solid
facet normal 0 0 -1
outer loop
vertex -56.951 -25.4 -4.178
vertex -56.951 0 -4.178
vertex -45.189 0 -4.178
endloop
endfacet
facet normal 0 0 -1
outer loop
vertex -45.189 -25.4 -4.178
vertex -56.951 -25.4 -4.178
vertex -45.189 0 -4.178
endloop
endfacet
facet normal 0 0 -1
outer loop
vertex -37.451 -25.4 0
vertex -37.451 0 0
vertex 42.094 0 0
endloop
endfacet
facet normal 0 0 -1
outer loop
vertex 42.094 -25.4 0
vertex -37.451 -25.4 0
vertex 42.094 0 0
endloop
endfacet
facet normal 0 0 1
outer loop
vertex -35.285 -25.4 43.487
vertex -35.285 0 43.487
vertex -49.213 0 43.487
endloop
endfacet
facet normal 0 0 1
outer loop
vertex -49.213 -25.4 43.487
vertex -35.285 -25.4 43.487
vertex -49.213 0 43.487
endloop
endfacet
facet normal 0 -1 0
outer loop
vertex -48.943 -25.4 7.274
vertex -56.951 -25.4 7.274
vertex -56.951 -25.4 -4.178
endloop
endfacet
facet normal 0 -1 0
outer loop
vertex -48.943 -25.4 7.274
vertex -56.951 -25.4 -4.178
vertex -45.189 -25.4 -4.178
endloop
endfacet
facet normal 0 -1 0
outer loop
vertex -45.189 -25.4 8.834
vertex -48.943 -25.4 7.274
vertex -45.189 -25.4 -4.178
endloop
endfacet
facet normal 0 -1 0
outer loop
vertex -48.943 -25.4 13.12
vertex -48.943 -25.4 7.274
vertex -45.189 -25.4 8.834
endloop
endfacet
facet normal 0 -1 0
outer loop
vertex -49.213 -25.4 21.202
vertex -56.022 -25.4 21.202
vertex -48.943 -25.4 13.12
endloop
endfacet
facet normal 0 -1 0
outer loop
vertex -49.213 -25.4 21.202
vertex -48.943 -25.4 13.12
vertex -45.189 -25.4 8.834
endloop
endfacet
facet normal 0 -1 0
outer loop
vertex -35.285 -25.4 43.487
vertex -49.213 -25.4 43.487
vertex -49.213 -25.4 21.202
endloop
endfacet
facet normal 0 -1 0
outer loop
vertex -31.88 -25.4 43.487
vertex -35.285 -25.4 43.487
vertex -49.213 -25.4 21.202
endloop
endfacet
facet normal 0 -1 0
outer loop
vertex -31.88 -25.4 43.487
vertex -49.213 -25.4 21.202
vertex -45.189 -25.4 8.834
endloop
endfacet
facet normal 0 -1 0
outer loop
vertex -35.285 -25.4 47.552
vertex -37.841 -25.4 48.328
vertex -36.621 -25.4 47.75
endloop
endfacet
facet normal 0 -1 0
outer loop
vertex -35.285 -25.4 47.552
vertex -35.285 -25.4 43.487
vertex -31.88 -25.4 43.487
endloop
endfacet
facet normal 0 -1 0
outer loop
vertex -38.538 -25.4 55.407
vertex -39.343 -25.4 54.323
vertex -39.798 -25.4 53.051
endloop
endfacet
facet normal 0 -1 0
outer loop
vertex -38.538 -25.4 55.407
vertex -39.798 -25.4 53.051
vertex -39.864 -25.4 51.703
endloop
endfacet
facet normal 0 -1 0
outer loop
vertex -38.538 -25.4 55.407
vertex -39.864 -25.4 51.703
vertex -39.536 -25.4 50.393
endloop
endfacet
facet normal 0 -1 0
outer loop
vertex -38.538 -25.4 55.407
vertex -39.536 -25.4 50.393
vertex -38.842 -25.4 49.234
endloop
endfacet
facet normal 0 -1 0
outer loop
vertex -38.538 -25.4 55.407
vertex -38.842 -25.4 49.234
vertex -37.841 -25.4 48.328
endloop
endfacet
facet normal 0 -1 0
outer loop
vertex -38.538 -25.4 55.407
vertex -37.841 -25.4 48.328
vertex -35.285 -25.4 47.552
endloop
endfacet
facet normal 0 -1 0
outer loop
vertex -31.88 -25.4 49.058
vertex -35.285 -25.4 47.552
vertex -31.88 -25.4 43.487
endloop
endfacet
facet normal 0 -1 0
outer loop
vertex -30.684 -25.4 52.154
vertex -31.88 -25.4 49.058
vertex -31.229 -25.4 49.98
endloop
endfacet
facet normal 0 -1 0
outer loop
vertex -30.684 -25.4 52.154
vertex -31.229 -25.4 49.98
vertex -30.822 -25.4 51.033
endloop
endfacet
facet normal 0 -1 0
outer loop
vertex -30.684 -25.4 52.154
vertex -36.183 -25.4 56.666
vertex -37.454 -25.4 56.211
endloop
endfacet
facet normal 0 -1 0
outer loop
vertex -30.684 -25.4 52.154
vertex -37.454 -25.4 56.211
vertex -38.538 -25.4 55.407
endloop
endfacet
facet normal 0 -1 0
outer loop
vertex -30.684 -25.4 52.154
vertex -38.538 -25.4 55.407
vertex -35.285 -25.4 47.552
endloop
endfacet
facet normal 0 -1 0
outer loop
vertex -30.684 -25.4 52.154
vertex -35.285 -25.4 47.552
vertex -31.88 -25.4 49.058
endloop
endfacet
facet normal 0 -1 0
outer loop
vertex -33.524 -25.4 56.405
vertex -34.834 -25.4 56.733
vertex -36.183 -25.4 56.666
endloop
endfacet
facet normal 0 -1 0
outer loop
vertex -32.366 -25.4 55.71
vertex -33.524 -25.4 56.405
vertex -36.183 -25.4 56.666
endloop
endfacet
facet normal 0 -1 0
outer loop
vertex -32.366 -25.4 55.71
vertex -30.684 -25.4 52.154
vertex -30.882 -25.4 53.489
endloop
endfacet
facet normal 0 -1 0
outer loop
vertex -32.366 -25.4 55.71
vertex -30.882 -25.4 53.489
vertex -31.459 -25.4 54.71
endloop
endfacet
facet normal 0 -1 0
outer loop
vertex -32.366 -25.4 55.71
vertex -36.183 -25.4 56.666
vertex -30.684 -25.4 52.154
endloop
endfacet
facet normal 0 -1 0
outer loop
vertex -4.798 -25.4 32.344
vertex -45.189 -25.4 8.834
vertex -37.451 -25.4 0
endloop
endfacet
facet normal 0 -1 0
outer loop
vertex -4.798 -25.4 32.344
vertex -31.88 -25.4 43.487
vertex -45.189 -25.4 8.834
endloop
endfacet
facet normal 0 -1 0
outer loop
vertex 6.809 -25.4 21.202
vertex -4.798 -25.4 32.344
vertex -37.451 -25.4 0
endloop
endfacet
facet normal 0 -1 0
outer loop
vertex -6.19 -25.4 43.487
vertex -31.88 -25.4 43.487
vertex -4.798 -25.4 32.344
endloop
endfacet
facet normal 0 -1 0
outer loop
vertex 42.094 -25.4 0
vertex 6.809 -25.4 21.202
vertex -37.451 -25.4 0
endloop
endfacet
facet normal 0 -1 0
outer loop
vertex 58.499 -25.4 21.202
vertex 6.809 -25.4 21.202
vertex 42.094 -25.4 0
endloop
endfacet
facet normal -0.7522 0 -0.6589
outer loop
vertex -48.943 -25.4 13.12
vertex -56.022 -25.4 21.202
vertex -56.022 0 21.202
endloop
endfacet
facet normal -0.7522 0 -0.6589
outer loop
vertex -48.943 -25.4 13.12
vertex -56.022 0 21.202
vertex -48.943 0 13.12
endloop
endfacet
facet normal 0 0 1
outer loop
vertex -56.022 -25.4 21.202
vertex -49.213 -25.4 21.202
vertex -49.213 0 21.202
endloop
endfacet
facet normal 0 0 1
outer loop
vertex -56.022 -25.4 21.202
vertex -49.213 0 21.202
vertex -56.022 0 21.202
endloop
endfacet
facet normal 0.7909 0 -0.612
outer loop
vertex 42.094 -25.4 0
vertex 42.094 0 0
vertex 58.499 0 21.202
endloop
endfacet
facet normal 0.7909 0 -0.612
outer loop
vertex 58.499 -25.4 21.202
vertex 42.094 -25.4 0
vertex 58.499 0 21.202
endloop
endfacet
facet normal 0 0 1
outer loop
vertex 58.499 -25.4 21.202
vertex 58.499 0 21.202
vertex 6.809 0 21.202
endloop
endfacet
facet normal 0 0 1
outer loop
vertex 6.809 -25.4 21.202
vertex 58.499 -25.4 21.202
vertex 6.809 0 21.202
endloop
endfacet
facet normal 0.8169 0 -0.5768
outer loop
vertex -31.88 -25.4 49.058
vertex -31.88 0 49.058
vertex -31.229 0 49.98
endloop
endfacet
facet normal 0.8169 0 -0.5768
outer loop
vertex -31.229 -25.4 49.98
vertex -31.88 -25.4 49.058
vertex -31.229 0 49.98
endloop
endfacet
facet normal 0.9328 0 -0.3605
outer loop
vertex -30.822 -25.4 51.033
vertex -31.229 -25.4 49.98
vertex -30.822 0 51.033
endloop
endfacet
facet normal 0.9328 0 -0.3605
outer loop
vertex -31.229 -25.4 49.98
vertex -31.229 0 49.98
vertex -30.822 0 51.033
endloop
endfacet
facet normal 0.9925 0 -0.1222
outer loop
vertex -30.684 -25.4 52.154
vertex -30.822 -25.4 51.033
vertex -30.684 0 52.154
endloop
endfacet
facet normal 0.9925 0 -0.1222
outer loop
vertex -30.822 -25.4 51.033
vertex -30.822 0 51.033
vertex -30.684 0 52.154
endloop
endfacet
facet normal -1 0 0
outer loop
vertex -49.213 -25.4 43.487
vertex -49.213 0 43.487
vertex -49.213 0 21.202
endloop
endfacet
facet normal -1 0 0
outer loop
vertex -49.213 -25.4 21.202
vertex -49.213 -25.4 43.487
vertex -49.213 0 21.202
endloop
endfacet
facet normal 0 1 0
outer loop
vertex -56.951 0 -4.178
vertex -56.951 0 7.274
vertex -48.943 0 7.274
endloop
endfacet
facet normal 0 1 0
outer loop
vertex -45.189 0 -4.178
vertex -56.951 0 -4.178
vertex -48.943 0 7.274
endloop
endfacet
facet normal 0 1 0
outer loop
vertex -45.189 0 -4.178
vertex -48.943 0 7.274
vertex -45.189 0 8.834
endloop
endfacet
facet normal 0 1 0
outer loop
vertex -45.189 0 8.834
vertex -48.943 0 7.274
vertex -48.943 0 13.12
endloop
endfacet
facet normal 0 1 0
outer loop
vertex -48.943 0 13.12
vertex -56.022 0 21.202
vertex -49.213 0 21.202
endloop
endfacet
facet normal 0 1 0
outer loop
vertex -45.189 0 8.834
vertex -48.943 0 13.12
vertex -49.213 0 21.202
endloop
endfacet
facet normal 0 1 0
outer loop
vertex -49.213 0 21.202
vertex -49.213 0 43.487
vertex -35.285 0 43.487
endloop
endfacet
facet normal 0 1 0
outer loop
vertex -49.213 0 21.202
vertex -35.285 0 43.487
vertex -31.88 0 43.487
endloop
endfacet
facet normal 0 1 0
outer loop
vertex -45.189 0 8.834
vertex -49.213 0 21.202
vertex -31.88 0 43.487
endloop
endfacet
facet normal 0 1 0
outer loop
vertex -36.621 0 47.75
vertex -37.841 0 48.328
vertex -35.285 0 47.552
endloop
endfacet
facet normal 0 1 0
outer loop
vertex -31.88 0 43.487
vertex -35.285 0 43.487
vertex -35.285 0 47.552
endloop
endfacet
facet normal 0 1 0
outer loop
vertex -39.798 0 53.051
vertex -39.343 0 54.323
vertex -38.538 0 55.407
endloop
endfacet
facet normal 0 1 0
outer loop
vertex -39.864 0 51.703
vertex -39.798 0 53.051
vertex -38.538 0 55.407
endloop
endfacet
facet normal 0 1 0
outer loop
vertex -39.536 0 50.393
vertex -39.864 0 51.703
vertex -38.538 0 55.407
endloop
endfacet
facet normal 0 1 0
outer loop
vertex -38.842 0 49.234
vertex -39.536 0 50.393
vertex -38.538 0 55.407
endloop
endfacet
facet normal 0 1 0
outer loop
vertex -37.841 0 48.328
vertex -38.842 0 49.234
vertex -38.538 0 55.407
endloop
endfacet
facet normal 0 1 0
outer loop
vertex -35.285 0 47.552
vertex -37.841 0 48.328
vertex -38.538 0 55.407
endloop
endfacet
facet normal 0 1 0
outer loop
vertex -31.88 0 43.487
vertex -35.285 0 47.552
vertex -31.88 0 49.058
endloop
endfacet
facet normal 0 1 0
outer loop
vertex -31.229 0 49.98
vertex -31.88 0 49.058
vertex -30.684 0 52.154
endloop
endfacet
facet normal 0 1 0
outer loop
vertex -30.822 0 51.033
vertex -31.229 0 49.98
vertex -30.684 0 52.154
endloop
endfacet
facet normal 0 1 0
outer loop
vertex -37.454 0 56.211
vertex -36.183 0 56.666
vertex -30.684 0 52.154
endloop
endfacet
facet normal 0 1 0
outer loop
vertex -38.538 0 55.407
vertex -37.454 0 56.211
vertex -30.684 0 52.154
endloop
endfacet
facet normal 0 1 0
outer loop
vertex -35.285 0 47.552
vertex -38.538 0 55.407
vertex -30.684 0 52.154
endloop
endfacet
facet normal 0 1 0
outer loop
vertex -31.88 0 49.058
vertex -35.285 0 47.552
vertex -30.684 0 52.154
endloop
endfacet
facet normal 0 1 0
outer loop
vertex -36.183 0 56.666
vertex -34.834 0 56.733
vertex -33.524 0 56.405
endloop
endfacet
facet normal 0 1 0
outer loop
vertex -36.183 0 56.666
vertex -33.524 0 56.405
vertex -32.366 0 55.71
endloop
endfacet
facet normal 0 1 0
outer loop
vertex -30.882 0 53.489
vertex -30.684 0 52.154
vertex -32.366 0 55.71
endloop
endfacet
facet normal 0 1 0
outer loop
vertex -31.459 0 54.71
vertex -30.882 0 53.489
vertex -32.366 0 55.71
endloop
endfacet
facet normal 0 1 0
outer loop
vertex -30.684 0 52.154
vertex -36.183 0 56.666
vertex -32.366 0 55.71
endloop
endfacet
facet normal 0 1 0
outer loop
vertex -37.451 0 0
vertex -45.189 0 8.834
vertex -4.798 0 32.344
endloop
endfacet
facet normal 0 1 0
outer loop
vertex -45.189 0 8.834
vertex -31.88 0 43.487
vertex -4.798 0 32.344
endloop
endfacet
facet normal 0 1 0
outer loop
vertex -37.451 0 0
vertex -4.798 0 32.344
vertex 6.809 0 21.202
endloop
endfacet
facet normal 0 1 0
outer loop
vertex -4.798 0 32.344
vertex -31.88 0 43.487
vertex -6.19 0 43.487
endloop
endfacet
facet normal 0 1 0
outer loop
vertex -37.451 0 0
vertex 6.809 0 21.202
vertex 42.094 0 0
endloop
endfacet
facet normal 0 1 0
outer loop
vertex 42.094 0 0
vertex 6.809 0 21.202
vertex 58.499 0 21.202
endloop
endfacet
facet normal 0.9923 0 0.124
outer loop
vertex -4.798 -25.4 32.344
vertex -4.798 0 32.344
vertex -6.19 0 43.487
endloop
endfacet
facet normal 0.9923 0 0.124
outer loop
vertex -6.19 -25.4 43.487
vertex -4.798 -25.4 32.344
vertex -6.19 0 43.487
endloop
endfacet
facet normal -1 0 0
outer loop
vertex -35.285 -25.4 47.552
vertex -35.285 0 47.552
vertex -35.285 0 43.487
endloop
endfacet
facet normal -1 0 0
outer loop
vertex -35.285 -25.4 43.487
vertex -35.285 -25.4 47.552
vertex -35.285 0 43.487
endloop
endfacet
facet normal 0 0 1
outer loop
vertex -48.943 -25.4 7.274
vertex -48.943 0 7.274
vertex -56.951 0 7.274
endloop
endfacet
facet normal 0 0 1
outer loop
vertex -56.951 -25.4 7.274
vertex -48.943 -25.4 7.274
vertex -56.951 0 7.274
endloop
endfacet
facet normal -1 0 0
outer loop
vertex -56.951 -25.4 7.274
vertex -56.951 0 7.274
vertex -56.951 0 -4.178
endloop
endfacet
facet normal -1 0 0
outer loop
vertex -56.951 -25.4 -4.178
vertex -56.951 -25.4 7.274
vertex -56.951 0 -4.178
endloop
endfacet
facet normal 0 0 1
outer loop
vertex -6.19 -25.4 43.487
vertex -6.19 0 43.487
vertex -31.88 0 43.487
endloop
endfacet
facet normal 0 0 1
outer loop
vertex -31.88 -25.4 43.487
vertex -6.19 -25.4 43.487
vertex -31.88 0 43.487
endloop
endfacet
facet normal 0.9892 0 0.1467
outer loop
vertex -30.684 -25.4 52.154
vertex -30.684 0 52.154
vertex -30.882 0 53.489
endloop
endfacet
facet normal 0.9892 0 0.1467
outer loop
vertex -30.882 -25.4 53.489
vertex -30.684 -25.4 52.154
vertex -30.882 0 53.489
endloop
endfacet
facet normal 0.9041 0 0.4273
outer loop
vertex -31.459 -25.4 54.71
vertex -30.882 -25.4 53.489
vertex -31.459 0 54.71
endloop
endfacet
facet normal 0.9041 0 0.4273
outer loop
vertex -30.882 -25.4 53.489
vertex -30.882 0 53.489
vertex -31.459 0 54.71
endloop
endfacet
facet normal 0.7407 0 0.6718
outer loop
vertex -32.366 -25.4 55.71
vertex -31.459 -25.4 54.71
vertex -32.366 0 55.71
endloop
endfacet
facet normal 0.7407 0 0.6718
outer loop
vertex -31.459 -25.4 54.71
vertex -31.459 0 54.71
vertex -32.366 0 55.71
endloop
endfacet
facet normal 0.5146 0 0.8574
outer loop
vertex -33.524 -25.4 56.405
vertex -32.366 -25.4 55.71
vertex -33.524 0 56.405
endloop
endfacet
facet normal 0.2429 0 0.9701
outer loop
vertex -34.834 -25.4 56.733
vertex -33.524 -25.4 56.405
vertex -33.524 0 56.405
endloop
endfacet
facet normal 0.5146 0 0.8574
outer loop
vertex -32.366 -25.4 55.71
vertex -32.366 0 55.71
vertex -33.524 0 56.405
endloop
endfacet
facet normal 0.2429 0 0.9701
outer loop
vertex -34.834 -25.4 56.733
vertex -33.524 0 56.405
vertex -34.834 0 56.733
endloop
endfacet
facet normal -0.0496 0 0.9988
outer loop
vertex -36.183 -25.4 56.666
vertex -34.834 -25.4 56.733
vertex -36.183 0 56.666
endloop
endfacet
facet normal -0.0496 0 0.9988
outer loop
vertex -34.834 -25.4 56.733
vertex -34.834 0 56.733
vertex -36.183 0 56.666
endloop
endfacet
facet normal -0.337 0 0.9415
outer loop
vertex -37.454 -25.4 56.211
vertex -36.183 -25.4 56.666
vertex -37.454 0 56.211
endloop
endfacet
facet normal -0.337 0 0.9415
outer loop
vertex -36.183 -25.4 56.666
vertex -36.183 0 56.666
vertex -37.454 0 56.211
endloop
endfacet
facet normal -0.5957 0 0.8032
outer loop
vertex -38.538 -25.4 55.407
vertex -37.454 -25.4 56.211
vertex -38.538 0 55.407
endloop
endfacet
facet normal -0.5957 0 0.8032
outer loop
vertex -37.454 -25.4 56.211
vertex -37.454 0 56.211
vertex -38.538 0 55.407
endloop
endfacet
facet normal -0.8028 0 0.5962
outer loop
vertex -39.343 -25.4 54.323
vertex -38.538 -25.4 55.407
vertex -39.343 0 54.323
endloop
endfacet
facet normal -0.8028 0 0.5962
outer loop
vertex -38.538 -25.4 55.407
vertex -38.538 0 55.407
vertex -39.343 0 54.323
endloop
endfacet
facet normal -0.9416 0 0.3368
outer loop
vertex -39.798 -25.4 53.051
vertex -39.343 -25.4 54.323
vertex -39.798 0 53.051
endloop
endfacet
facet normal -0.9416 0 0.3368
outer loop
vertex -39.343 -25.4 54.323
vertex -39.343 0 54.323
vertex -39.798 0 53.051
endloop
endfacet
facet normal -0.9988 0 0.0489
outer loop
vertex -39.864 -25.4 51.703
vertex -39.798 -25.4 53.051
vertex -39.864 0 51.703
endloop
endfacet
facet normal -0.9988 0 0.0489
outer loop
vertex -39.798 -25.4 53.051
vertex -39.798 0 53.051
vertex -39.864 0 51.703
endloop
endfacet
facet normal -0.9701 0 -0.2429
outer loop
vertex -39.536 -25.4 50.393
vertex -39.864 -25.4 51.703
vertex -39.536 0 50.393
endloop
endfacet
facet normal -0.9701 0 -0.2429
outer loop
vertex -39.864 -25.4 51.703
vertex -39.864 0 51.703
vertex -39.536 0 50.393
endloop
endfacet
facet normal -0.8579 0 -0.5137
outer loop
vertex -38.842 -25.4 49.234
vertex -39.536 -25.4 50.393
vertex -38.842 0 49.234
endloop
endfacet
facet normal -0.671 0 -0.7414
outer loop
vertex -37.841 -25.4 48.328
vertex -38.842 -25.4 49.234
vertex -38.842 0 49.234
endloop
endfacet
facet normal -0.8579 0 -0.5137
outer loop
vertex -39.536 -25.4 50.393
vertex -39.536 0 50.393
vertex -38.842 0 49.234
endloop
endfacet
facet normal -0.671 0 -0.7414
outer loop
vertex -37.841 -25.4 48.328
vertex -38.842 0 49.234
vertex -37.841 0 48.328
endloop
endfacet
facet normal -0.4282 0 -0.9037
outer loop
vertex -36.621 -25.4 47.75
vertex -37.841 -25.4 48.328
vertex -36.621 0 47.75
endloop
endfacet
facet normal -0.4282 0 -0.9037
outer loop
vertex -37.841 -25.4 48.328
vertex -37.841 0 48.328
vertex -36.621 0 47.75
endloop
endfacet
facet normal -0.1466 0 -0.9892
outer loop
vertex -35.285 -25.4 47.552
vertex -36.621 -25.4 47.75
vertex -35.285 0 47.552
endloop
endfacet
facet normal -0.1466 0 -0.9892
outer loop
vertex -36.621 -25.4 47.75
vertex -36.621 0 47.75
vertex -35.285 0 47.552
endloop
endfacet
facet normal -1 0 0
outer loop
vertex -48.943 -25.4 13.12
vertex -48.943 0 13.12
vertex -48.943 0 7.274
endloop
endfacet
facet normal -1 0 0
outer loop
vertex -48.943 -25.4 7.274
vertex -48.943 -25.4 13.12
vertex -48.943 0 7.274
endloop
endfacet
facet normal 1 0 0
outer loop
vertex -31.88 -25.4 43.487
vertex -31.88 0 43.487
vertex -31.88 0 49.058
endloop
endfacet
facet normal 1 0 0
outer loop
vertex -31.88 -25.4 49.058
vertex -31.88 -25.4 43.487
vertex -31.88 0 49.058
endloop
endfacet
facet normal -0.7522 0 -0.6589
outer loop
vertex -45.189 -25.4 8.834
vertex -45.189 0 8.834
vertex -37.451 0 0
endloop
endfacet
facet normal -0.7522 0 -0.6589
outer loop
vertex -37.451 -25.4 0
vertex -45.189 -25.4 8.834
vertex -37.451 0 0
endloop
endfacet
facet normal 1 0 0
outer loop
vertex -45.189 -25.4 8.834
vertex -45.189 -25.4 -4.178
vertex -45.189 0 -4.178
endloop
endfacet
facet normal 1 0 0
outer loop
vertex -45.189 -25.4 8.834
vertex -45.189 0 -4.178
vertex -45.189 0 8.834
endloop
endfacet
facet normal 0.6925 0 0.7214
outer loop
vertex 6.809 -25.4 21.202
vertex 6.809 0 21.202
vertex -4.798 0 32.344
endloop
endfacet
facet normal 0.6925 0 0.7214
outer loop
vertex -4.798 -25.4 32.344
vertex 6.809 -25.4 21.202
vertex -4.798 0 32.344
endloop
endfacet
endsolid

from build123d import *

# Parameters (mm, degrees)
F1_DEPTH = 25.4


with BuildPart() as f1:
    # F0 (on Front) → F1 (new body)
    with BuildSketch(Plane.XZ):
        Polygon((-49.2131151259, 21.2018769234), (-56.0224764049, 21.2018769234), (-48.9432296743, 13.1197362788), (-45.1893992722, 8.8341129038), (-37.4514907598, 0), (42.0942343771, 0), (58.4986023605, 21.2018769234), (6.8093636073, 21.2018769234), (-3.4046829678, 21.2018769234), align=None)
        Polygon((-45.1893992722, 8.8341129038), (-48.9432296743, 13.1197362788), (-48.9432296743, 7.2736367583), (-56.9510273635, 7.2736367583), (-56.9510273635, -4.1784718633), (-45.1893992722, -4.1784718633), align=None)
        Polygon((-49.2131151259, 43.4870608151), (-49.2131151259, 21.2018769234), (-3.4046829678, 21.2018769234), (-4.7975066118, 32.3444688693), (-6.1903302558, 43.4870608151), (-31.8801924586, 43.4870608151), (-35.2848768234, 43.4870608151), align=None)
        Polygon((-4.7975066118, 32.3444688693), (-3.4046829678, 21.2018769234), (6.8093636073, 21.2018769234), align=None)
        with BuildLine():
            Line((-35.2848768234, 47.5522301825), (-35.2848768234, 43.4870608151))
            Line((-35.2848768234, 43.4870608151), (-31.8801924586, 43.4870608151))
            Line((-31.8801924586, 43.4870608151), (-31.8801924586, 49.0583635867))
            ThreePointArc((-31.8801924586, 49.0583635867), (-33.4234047275, 47.9455763399), (-35.2848768234, 47.5522301825))
        make_face()
        with BuildLine():
            ThreePointArc((-30.6835867198, 52.1535202861), (-38.5384802579, 55.4071237206), (-35.2848768234, 47.5522301825))
            Line((-35.2848768234, 47.5522301825), (-35.2848768234, 52.1535202861))
            Line((-35.2848768234, 52.1535202861), (-31.8801924586, 52.1535202861))
            Line((-31.8801924586, 52.1535202861), (-31.8801924586, 49.0583635867))
            ThreePointArc((-31.8801924586, 49.0583635867), (-30.9931515822, 50.4943141289), (-30.6835867198, 52.1535202861))
        make_face()
        with BuildLine():
            Line((-35.2848768234, 52.1535202861), (-35.2848768234, 47.5522301825))
            ThreePointArc((-35.2848768234, 47.5522301825), (-33.4234047275, 47.9455763399), (-31.8801924586, 49.0583635867))
            Line((-31.8801924586, 49.0583635867), (-31.8801924586, 52.1535202861))
            Line((-31.8801924586, 52.1535202861), (-35.2848768234, 52.1535202861))
        make_face()
    extrude(amount=F1_DEPTH)


solid = f1.part
